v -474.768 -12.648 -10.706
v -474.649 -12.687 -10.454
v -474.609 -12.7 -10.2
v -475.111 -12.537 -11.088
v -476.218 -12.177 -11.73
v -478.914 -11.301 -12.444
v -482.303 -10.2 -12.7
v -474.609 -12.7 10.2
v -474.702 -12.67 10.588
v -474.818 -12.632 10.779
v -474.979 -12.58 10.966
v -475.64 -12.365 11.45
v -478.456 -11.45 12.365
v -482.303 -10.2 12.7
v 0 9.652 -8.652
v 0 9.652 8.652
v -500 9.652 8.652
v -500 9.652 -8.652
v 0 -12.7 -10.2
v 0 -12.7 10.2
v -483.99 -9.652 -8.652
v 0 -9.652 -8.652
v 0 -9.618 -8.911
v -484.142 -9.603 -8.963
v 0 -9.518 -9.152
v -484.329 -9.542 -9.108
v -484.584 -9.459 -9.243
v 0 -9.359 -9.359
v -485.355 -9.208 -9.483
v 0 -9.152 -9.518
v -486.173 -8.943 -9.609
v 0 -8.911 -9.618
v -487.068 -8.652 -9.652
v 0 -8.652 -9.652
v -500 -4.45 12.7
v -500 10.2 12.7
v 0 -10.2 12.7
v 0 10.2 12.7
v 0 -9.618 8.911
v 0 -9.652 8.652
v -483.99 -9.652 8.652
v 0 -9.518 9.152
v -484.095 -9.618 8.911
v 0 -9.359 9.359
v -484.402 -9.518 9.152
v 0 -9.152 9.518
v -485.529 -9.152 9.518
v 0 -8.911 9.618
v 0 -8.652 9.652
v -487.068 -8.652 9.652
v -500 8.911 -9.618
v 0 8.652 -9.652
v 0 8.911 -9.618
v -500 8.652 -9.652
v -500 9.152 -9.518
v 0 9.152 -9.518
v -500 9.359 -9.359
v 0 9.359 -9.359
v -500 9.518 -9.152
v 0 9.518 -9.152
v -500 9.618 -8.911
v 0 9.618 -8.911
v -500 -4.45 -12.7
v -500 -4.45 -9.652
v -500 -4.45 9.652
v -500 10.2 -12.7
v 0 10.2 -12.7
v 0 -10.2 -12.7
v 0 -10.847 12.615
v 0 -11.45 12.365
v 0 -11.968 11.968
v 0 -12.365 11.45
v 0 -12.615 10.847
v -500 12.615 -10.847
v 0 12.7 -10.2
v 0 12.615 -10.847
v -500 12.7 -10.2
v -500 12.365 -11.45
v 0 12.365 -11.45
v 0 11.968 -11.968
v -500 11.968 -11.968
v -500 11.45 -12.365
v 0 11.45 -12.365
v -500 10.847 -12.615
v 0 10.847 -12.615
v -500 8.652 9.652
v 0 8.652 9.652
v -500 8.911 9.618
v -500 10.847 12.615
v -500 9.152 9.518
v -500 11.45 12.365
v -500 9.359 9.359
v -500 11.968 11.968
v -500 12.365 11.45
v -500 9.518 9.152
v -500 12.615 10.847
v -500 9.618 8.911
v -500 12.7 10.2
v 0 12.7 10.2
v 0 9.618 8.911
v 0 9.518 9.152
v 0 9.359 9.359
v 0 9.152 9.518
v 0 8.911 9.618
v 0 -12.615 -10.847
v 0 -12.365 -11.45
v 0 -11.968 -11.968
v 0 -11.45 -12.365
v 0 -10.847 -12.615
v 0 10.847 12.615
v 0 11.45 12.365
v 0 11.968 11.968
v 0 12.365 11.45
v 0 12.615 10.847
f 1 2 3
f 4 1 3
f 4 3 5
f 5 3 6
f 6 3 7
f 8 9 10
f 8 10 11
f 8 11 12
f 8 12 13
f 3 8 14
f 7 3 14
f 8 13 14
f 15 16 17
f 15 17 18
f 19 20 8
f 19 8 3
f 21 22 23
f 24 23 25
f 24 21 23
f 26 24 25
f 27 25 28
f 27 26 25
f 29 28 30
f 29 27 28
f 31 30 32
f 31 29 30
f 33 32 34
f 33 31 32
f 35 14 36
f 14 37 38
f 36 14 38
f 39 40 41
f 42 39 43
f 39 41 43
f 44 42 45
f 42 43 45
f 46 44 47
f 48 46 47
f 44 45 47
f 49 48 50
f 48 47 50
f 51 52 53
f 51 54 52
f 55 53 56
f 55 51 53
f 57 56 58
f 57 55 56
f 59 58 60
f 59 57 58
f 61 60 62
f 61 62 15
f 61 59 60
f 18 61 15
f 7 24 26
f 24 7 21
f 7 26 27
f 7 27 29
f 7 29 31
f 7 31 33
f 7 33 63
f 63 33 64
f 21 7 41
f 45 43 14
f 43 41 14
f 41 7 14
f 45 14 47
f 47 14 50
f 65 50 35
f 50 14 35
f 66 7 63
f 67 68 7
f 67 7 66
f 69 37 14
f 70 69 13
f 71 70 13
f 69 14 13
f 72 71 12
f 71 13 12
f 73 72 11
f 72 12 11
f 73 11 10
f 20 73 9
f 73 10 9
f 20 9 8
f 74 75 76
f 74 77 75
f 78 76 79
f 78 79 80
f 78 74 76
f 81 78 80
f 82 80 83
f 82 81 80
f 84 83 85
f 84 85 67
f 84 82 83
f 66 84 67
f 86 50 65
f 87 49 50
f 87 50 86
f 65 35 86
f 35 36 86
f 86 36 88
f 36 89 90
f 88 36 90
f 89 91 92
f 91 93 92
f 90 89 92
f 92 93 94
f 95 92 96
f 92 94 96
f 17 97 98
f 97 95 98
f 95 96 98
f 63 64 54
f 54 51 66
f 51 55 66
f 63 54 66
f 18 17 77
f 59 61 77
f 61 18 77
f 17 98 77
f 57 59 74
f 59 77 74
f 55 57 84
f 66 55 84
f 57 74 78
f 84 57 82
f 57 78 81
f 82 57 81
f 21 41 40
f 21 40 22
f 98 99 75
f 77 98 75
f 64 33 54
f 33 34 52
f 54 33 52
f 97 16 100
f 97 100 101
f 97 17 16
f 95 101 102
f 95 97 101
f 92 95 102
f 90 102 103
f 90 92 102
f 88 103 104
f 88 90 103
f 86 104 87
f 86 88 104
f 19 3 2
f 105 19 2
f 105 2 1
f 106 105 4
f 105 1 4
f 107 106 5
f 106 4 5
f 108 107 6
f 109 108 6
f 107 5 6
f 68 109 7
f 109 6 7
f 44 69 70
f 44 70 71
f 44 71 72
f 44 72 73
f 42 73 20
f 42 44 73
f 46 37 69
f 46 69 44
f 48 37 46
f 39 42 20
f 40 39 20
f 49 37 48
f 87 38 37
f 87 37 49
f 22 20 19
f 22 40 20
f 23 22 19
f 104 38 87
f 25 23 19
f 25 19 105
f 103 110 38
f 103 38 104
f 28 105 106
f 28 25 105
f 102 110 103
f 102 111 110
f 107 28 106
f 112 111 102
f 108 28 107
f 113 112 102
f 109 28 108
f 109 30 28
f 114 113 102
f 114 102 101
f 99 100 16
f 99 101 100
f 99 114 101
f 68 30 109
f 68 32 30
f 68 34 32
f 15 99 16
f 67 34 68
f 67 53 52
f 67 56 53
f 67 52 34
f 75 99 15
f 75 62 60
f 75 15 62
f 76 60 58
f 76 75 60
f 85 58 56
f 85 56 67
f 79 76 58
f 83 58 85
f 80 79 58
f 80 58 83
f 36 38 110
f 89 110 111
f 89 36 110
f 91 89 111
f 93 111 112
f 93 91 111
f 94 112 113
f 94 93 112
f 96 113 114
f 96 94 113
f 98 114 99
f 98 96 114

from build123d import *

# Parameters (mm, degrees)
SKETCH3_W           = 25.4
SKETCH3_H           = 25.4
SKETCH3_W_2         = 19.304
SKETCH3_H_2         = 19.304
BOSS_EXTRUDE1_DEPTH = 500
FILLET1_R           = 2.5
FILLET2_R           = 1
CUT_EXTRUDE1_DEPTH  = 501.805800685


with BuildPart() as part:
    # Sketch3 → Boss-Extrude1 (new body)
    with BuildSketch(Plane(origin=(0, 0, 0), x_dir=(0, 0, -1), z_dir=(1, 0, 0))):
        Rectangle(SKETCH3_W, SKETCH3_H)
        Rectangle(SKETCH3_W_2, SKETCH3_H_2, mode=Mode.SUBTRACT)
    extrude(amount=-BOSS_EXTRUDE1_DEPTH)

    # Fillet1
    fillet1_edges = [part.edges().sort_by_distance(p)[0] for p in [
        (-250, -12.7, -12.7),
        (-250, -12.7, 12.7),
        (-250, 12.7, 12.7),
        (-250, 12.7, -12.7),
    ]]
    fillet(fillet1_edges, radius=FILLET1_R)

    # Fillet2
    fillet2_edges = [part.edges().sort_by_distance(p)[0] for p in [
        (-250, 9.652, -9.652),
        (-250, -9.652, -9.652),
        (-250, -9.652, 9.652),
        (-250, 9.652, 9.652),
    ]]
    fillet(fillet2_edges, radius=FILLET2_R)

    # Sketch4 → Cut-Extrude1 (cut, through all)
    with BuildSketch(Plane.XY.offset(12.7)):
        Polygon((-482.303319661, -10.2), (-500, -4.45), (-500, -10.2), align=None)
        Polygon((-474.609110818, -12.7), (-482.303319661, -10.2), (-500, -10.2), (-500, -12.7), align=None)
    extrude(amount=-CUT_EXTRUDE1_DEPTH, mode=Mode.SUBTRACT)


solid = part.part
